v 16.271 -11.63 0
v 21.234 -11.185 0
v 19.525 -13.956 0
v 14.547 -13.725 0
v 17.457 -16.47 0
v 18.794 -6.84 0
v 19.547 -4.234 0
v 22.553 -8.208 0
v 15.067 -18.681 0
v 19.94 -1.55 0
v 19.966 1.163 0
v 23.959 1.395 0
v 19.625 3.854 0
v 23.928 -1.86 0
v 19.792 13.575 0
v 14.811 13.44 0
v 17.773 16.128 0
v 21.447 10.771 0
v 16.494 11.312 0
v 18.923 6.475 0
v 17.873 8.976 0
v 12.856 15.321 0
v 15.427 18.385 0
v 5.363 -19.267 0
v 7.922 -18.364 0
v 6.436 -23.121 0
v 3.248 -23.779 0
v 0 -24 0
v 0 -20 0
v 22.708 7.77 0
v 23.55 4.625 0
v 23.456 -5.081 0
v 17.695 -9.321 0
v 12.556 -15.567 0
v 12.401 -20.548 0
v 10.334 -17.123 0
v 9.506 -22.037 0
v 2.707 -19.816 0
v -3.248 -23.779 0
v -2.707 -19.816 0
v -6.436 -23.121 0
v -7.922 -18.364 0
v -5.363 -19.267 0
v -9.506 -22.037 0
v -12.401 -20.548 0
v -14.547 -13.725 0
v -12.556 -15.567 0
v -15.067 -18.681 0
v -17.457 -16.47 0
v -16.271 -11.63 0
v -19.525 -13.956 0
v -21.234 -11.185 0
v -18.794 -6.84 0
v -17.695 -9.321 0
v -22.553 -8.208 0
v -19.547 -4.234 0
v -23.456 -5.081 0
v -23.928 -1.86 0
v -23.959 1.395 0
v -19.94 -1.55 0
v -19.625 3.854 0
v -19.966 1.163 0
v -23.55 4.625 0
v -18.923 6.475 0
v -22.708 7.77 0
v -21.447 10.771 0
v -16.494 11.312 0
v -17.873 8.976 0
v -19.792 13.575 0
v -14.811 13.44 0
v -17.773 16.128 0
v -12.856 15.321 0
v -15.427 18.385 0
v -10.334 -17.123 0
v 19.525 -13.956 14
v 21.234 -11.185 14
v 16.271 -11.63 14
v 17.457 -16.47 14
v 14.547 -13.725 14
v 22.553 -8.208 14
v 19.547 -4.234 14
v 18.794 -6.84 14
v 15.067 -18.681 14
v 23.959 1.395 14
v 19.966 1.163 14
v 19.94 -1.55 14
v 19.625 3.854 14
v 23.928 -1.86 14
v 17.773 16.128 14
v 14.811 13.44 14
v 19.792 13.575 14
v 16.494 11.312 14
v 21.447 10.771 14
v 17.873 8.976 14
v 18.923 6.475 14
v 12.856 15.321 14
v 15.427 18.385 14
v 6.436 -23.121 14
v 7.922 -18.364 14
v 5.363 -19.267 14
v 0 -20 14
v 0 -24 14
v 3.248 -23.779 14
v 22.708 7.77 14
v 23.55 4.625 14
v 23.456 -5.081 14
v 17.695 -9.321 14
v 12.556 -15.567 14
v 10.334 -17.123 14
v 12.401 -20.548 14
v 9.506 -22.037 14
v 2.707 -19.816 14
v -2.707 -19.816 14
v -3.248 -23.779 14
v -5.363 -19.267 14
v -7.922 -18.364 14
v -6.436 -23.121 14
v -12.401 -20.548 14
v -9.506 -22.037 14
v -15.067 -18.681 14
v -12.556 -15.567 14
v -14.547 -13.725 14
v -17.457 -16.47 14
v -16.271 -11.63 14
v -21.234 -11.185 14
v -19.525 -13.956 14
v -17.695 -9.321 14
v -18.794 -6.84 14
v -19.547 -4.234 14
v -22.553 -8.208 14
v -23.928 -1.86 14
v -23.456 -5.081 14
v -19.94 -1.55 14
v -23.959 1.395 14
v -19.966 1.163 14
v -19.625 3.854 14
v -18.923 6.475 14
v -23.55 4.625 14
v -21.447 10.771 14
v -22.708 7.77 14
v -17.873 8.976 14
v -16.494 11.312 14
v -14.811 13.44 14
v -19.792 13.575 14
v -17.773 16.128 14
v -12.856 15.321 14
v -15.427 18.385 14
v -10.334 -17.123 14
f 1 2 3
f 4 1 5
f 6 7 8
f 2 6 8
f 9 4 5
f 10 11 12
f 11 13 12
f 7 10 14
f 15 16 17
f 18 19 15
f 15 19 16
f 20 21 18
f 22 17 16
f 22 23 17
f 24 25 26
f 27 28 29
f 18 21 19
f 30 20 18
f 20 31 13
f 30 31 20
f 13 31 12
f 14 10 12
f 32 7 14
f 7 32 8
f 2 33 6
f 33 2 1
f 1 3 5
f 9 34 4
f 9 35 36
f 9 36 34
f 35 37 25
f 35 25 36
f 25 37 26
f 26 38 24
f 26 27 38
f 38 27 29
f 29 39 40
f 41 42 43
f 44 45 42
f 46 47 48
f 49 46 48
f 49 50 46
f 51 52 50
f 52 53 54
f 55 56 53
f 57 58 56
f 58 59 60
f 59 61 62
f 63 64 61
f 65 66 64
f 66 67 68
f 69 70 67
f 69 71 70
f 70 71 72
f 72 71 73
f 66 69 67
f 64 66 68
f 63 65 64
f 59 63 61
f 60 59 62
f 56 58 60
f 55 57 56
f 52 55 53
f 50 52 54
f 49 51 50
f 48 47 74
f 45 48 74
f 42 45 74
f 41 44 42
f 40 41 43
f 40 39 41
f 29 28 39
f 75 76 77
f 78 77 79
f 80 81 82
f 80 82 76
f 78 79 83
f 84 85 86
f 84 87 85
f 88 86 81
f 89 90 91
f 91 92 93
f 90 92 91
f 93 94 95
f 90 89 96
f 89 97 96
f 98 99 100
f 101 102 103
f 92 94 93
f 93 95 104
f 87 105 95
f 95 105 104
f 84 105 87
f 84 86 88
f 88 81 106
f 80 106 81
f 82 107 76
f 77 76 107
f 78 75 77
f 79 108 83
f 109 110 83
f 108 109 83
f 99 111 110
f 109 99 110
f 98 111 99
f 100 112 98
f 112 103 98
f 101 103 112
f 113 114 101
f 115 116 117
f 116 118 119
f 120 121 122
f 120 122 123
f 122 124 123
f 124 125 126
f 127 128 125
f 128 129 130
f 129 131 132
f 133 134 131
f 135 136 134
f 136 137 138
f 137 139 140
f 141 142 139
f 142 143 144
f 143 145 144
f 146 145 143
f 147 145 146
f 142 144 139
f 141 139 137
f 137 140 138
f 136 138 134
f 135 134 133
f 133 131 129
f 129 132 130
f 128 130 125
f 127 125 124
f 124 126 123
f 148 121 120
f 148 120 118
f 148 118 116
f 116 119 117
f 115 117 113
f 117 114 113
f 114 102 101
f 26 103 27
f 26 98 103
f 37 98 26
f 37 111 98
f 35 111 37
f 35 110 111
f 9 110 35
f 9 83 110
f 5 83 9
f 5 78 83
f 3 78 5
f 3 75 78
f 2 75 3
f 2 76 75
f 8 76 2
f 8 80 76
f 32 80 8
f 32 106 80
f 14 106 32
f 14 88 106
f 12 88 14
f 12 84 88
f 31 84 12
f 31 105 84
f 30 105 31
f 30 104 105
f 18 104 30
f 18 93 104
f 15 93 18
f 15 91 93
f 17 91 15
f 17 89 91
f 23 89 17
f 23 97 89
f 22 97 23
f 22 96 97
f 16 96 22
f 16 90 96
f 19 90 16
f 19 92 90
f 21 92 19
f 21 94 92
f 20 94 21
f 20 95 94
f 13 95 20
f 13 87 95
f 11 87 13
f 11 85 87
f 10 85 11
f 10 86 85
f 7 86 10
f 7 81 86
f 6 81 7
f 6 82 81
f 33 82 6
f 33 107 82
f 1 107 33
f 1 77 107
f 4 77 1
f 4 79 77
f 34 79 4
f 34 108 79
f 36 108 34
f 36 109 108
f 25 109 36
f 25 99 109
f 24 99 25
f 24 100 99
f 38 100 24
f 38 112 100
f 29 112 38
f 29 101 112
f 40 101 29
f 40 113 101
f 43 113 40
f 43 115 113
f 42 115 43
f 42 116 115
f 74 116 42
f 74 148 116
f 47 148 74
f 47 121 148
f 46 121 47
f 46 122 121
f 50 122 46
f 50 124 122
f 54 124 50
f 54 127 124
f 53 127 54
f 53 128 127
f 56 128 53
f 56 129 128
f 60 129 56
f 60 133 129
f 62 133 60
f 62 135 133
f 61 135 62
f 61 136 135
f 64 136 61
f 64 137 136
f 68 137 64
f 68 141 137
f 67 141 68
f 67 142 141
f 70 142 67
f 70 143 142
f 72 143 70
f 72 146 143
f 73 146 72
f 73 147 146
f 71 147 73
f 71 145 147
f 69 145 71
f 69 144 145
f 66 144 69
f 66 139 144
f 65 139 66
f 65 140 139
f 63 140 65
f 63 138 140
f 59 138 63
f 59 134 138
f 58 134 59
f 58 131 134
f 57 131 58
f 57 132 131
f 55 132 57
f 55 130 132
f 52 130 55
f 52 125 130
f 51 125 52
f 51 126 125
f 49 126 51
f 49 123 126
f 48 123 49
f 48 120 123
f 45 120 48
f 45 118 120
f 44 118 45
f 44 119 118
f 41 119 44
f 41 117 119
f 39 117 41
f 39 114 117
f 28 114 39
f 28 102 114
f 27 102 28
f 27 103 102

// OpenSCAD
$fn = 32;

// ----------------------------------------------------------------------
// Spring clip: 48 mm outside, 4 mm band, 80 degree opening
// ----------------------------------------------------------------------

// --- parameters (mm) ---
outer_r = 24;             // clip outside radius
inner_r = 20;             // clip bore radius
band = 4;                 // band thickness
clip_w = 14;              // clip width
opening = 80;             // opening angle

clip_profile = [[-15.427, 18.385], [-17.773, 16.128], [-19.792, 13.575], [-21.447, 10.771], [-22.708, 7.77], [-23.55, 4.625], [-23.959, 1.395], [-23.928, -1.86], [-23.456, -5.081], [-22.553, -8.208], [-21.234, -11.185], [-19.525, -13.956], [-17.457, -16.47], [-15.067, -18.681], [-12.401, -20.548], [-9.506, -22.037], [-6.436, -23.121], [-3.248, -23.779], [0, -24], [3.248, -23.779], [6.436, -23.121], [9.506, -22.037], [12.401, -20.548], [15.067, -18.681], [17.457, -16.47], [19.525, -13.956], [21.234, -11.185], [22.553, -8.208], [23.456, -5.081], [23.928, -1.86], [23.959, 1.395], [23.55, 4.625], [22.708, 7.77], [21.447, 10.771], [19.792, 13.575], [17.773, 16.128], [15.427, 18.385], [12.856, 15.321], [14.811, 13.44], [16.494, 11.312], [17.873, 8.976], [18.923, 6.475], [19.625, 3.854], [19.966, 1.163], [19.94, -1.55], [19.547, -4.234], [18.794, -6.84], [17.695, -9.321], [16.271, -11.63], [14.547, -13.725], [12.556, -15.567], [10.334, -17.123], [7.922, -18.364], [5.363, -19.267], [2.707, -19.816], [0, -20], [-2.707, -19.816], [-5.363, -19.267], [-7.922, -18.364], [-10.334, -17.123], [-12.556, -15.567], [-14.547, -13.725], [-16.271, -11.63], [-17.695, -9.321], [-18.794, -6.84], [-19.547, -4.234], [-19.94, -1.55], [-19.966, 1.163], [-19.625, 3.854], [-18.923, 6.475], [-17.873, 8.976], [-16.494, 11.312], [-14.811, 13.44], [-12.856, 15.321]];

difference() {
  union() {
    linear_extrude(height = clip_w) polygon(clip_profile);
  }
}
